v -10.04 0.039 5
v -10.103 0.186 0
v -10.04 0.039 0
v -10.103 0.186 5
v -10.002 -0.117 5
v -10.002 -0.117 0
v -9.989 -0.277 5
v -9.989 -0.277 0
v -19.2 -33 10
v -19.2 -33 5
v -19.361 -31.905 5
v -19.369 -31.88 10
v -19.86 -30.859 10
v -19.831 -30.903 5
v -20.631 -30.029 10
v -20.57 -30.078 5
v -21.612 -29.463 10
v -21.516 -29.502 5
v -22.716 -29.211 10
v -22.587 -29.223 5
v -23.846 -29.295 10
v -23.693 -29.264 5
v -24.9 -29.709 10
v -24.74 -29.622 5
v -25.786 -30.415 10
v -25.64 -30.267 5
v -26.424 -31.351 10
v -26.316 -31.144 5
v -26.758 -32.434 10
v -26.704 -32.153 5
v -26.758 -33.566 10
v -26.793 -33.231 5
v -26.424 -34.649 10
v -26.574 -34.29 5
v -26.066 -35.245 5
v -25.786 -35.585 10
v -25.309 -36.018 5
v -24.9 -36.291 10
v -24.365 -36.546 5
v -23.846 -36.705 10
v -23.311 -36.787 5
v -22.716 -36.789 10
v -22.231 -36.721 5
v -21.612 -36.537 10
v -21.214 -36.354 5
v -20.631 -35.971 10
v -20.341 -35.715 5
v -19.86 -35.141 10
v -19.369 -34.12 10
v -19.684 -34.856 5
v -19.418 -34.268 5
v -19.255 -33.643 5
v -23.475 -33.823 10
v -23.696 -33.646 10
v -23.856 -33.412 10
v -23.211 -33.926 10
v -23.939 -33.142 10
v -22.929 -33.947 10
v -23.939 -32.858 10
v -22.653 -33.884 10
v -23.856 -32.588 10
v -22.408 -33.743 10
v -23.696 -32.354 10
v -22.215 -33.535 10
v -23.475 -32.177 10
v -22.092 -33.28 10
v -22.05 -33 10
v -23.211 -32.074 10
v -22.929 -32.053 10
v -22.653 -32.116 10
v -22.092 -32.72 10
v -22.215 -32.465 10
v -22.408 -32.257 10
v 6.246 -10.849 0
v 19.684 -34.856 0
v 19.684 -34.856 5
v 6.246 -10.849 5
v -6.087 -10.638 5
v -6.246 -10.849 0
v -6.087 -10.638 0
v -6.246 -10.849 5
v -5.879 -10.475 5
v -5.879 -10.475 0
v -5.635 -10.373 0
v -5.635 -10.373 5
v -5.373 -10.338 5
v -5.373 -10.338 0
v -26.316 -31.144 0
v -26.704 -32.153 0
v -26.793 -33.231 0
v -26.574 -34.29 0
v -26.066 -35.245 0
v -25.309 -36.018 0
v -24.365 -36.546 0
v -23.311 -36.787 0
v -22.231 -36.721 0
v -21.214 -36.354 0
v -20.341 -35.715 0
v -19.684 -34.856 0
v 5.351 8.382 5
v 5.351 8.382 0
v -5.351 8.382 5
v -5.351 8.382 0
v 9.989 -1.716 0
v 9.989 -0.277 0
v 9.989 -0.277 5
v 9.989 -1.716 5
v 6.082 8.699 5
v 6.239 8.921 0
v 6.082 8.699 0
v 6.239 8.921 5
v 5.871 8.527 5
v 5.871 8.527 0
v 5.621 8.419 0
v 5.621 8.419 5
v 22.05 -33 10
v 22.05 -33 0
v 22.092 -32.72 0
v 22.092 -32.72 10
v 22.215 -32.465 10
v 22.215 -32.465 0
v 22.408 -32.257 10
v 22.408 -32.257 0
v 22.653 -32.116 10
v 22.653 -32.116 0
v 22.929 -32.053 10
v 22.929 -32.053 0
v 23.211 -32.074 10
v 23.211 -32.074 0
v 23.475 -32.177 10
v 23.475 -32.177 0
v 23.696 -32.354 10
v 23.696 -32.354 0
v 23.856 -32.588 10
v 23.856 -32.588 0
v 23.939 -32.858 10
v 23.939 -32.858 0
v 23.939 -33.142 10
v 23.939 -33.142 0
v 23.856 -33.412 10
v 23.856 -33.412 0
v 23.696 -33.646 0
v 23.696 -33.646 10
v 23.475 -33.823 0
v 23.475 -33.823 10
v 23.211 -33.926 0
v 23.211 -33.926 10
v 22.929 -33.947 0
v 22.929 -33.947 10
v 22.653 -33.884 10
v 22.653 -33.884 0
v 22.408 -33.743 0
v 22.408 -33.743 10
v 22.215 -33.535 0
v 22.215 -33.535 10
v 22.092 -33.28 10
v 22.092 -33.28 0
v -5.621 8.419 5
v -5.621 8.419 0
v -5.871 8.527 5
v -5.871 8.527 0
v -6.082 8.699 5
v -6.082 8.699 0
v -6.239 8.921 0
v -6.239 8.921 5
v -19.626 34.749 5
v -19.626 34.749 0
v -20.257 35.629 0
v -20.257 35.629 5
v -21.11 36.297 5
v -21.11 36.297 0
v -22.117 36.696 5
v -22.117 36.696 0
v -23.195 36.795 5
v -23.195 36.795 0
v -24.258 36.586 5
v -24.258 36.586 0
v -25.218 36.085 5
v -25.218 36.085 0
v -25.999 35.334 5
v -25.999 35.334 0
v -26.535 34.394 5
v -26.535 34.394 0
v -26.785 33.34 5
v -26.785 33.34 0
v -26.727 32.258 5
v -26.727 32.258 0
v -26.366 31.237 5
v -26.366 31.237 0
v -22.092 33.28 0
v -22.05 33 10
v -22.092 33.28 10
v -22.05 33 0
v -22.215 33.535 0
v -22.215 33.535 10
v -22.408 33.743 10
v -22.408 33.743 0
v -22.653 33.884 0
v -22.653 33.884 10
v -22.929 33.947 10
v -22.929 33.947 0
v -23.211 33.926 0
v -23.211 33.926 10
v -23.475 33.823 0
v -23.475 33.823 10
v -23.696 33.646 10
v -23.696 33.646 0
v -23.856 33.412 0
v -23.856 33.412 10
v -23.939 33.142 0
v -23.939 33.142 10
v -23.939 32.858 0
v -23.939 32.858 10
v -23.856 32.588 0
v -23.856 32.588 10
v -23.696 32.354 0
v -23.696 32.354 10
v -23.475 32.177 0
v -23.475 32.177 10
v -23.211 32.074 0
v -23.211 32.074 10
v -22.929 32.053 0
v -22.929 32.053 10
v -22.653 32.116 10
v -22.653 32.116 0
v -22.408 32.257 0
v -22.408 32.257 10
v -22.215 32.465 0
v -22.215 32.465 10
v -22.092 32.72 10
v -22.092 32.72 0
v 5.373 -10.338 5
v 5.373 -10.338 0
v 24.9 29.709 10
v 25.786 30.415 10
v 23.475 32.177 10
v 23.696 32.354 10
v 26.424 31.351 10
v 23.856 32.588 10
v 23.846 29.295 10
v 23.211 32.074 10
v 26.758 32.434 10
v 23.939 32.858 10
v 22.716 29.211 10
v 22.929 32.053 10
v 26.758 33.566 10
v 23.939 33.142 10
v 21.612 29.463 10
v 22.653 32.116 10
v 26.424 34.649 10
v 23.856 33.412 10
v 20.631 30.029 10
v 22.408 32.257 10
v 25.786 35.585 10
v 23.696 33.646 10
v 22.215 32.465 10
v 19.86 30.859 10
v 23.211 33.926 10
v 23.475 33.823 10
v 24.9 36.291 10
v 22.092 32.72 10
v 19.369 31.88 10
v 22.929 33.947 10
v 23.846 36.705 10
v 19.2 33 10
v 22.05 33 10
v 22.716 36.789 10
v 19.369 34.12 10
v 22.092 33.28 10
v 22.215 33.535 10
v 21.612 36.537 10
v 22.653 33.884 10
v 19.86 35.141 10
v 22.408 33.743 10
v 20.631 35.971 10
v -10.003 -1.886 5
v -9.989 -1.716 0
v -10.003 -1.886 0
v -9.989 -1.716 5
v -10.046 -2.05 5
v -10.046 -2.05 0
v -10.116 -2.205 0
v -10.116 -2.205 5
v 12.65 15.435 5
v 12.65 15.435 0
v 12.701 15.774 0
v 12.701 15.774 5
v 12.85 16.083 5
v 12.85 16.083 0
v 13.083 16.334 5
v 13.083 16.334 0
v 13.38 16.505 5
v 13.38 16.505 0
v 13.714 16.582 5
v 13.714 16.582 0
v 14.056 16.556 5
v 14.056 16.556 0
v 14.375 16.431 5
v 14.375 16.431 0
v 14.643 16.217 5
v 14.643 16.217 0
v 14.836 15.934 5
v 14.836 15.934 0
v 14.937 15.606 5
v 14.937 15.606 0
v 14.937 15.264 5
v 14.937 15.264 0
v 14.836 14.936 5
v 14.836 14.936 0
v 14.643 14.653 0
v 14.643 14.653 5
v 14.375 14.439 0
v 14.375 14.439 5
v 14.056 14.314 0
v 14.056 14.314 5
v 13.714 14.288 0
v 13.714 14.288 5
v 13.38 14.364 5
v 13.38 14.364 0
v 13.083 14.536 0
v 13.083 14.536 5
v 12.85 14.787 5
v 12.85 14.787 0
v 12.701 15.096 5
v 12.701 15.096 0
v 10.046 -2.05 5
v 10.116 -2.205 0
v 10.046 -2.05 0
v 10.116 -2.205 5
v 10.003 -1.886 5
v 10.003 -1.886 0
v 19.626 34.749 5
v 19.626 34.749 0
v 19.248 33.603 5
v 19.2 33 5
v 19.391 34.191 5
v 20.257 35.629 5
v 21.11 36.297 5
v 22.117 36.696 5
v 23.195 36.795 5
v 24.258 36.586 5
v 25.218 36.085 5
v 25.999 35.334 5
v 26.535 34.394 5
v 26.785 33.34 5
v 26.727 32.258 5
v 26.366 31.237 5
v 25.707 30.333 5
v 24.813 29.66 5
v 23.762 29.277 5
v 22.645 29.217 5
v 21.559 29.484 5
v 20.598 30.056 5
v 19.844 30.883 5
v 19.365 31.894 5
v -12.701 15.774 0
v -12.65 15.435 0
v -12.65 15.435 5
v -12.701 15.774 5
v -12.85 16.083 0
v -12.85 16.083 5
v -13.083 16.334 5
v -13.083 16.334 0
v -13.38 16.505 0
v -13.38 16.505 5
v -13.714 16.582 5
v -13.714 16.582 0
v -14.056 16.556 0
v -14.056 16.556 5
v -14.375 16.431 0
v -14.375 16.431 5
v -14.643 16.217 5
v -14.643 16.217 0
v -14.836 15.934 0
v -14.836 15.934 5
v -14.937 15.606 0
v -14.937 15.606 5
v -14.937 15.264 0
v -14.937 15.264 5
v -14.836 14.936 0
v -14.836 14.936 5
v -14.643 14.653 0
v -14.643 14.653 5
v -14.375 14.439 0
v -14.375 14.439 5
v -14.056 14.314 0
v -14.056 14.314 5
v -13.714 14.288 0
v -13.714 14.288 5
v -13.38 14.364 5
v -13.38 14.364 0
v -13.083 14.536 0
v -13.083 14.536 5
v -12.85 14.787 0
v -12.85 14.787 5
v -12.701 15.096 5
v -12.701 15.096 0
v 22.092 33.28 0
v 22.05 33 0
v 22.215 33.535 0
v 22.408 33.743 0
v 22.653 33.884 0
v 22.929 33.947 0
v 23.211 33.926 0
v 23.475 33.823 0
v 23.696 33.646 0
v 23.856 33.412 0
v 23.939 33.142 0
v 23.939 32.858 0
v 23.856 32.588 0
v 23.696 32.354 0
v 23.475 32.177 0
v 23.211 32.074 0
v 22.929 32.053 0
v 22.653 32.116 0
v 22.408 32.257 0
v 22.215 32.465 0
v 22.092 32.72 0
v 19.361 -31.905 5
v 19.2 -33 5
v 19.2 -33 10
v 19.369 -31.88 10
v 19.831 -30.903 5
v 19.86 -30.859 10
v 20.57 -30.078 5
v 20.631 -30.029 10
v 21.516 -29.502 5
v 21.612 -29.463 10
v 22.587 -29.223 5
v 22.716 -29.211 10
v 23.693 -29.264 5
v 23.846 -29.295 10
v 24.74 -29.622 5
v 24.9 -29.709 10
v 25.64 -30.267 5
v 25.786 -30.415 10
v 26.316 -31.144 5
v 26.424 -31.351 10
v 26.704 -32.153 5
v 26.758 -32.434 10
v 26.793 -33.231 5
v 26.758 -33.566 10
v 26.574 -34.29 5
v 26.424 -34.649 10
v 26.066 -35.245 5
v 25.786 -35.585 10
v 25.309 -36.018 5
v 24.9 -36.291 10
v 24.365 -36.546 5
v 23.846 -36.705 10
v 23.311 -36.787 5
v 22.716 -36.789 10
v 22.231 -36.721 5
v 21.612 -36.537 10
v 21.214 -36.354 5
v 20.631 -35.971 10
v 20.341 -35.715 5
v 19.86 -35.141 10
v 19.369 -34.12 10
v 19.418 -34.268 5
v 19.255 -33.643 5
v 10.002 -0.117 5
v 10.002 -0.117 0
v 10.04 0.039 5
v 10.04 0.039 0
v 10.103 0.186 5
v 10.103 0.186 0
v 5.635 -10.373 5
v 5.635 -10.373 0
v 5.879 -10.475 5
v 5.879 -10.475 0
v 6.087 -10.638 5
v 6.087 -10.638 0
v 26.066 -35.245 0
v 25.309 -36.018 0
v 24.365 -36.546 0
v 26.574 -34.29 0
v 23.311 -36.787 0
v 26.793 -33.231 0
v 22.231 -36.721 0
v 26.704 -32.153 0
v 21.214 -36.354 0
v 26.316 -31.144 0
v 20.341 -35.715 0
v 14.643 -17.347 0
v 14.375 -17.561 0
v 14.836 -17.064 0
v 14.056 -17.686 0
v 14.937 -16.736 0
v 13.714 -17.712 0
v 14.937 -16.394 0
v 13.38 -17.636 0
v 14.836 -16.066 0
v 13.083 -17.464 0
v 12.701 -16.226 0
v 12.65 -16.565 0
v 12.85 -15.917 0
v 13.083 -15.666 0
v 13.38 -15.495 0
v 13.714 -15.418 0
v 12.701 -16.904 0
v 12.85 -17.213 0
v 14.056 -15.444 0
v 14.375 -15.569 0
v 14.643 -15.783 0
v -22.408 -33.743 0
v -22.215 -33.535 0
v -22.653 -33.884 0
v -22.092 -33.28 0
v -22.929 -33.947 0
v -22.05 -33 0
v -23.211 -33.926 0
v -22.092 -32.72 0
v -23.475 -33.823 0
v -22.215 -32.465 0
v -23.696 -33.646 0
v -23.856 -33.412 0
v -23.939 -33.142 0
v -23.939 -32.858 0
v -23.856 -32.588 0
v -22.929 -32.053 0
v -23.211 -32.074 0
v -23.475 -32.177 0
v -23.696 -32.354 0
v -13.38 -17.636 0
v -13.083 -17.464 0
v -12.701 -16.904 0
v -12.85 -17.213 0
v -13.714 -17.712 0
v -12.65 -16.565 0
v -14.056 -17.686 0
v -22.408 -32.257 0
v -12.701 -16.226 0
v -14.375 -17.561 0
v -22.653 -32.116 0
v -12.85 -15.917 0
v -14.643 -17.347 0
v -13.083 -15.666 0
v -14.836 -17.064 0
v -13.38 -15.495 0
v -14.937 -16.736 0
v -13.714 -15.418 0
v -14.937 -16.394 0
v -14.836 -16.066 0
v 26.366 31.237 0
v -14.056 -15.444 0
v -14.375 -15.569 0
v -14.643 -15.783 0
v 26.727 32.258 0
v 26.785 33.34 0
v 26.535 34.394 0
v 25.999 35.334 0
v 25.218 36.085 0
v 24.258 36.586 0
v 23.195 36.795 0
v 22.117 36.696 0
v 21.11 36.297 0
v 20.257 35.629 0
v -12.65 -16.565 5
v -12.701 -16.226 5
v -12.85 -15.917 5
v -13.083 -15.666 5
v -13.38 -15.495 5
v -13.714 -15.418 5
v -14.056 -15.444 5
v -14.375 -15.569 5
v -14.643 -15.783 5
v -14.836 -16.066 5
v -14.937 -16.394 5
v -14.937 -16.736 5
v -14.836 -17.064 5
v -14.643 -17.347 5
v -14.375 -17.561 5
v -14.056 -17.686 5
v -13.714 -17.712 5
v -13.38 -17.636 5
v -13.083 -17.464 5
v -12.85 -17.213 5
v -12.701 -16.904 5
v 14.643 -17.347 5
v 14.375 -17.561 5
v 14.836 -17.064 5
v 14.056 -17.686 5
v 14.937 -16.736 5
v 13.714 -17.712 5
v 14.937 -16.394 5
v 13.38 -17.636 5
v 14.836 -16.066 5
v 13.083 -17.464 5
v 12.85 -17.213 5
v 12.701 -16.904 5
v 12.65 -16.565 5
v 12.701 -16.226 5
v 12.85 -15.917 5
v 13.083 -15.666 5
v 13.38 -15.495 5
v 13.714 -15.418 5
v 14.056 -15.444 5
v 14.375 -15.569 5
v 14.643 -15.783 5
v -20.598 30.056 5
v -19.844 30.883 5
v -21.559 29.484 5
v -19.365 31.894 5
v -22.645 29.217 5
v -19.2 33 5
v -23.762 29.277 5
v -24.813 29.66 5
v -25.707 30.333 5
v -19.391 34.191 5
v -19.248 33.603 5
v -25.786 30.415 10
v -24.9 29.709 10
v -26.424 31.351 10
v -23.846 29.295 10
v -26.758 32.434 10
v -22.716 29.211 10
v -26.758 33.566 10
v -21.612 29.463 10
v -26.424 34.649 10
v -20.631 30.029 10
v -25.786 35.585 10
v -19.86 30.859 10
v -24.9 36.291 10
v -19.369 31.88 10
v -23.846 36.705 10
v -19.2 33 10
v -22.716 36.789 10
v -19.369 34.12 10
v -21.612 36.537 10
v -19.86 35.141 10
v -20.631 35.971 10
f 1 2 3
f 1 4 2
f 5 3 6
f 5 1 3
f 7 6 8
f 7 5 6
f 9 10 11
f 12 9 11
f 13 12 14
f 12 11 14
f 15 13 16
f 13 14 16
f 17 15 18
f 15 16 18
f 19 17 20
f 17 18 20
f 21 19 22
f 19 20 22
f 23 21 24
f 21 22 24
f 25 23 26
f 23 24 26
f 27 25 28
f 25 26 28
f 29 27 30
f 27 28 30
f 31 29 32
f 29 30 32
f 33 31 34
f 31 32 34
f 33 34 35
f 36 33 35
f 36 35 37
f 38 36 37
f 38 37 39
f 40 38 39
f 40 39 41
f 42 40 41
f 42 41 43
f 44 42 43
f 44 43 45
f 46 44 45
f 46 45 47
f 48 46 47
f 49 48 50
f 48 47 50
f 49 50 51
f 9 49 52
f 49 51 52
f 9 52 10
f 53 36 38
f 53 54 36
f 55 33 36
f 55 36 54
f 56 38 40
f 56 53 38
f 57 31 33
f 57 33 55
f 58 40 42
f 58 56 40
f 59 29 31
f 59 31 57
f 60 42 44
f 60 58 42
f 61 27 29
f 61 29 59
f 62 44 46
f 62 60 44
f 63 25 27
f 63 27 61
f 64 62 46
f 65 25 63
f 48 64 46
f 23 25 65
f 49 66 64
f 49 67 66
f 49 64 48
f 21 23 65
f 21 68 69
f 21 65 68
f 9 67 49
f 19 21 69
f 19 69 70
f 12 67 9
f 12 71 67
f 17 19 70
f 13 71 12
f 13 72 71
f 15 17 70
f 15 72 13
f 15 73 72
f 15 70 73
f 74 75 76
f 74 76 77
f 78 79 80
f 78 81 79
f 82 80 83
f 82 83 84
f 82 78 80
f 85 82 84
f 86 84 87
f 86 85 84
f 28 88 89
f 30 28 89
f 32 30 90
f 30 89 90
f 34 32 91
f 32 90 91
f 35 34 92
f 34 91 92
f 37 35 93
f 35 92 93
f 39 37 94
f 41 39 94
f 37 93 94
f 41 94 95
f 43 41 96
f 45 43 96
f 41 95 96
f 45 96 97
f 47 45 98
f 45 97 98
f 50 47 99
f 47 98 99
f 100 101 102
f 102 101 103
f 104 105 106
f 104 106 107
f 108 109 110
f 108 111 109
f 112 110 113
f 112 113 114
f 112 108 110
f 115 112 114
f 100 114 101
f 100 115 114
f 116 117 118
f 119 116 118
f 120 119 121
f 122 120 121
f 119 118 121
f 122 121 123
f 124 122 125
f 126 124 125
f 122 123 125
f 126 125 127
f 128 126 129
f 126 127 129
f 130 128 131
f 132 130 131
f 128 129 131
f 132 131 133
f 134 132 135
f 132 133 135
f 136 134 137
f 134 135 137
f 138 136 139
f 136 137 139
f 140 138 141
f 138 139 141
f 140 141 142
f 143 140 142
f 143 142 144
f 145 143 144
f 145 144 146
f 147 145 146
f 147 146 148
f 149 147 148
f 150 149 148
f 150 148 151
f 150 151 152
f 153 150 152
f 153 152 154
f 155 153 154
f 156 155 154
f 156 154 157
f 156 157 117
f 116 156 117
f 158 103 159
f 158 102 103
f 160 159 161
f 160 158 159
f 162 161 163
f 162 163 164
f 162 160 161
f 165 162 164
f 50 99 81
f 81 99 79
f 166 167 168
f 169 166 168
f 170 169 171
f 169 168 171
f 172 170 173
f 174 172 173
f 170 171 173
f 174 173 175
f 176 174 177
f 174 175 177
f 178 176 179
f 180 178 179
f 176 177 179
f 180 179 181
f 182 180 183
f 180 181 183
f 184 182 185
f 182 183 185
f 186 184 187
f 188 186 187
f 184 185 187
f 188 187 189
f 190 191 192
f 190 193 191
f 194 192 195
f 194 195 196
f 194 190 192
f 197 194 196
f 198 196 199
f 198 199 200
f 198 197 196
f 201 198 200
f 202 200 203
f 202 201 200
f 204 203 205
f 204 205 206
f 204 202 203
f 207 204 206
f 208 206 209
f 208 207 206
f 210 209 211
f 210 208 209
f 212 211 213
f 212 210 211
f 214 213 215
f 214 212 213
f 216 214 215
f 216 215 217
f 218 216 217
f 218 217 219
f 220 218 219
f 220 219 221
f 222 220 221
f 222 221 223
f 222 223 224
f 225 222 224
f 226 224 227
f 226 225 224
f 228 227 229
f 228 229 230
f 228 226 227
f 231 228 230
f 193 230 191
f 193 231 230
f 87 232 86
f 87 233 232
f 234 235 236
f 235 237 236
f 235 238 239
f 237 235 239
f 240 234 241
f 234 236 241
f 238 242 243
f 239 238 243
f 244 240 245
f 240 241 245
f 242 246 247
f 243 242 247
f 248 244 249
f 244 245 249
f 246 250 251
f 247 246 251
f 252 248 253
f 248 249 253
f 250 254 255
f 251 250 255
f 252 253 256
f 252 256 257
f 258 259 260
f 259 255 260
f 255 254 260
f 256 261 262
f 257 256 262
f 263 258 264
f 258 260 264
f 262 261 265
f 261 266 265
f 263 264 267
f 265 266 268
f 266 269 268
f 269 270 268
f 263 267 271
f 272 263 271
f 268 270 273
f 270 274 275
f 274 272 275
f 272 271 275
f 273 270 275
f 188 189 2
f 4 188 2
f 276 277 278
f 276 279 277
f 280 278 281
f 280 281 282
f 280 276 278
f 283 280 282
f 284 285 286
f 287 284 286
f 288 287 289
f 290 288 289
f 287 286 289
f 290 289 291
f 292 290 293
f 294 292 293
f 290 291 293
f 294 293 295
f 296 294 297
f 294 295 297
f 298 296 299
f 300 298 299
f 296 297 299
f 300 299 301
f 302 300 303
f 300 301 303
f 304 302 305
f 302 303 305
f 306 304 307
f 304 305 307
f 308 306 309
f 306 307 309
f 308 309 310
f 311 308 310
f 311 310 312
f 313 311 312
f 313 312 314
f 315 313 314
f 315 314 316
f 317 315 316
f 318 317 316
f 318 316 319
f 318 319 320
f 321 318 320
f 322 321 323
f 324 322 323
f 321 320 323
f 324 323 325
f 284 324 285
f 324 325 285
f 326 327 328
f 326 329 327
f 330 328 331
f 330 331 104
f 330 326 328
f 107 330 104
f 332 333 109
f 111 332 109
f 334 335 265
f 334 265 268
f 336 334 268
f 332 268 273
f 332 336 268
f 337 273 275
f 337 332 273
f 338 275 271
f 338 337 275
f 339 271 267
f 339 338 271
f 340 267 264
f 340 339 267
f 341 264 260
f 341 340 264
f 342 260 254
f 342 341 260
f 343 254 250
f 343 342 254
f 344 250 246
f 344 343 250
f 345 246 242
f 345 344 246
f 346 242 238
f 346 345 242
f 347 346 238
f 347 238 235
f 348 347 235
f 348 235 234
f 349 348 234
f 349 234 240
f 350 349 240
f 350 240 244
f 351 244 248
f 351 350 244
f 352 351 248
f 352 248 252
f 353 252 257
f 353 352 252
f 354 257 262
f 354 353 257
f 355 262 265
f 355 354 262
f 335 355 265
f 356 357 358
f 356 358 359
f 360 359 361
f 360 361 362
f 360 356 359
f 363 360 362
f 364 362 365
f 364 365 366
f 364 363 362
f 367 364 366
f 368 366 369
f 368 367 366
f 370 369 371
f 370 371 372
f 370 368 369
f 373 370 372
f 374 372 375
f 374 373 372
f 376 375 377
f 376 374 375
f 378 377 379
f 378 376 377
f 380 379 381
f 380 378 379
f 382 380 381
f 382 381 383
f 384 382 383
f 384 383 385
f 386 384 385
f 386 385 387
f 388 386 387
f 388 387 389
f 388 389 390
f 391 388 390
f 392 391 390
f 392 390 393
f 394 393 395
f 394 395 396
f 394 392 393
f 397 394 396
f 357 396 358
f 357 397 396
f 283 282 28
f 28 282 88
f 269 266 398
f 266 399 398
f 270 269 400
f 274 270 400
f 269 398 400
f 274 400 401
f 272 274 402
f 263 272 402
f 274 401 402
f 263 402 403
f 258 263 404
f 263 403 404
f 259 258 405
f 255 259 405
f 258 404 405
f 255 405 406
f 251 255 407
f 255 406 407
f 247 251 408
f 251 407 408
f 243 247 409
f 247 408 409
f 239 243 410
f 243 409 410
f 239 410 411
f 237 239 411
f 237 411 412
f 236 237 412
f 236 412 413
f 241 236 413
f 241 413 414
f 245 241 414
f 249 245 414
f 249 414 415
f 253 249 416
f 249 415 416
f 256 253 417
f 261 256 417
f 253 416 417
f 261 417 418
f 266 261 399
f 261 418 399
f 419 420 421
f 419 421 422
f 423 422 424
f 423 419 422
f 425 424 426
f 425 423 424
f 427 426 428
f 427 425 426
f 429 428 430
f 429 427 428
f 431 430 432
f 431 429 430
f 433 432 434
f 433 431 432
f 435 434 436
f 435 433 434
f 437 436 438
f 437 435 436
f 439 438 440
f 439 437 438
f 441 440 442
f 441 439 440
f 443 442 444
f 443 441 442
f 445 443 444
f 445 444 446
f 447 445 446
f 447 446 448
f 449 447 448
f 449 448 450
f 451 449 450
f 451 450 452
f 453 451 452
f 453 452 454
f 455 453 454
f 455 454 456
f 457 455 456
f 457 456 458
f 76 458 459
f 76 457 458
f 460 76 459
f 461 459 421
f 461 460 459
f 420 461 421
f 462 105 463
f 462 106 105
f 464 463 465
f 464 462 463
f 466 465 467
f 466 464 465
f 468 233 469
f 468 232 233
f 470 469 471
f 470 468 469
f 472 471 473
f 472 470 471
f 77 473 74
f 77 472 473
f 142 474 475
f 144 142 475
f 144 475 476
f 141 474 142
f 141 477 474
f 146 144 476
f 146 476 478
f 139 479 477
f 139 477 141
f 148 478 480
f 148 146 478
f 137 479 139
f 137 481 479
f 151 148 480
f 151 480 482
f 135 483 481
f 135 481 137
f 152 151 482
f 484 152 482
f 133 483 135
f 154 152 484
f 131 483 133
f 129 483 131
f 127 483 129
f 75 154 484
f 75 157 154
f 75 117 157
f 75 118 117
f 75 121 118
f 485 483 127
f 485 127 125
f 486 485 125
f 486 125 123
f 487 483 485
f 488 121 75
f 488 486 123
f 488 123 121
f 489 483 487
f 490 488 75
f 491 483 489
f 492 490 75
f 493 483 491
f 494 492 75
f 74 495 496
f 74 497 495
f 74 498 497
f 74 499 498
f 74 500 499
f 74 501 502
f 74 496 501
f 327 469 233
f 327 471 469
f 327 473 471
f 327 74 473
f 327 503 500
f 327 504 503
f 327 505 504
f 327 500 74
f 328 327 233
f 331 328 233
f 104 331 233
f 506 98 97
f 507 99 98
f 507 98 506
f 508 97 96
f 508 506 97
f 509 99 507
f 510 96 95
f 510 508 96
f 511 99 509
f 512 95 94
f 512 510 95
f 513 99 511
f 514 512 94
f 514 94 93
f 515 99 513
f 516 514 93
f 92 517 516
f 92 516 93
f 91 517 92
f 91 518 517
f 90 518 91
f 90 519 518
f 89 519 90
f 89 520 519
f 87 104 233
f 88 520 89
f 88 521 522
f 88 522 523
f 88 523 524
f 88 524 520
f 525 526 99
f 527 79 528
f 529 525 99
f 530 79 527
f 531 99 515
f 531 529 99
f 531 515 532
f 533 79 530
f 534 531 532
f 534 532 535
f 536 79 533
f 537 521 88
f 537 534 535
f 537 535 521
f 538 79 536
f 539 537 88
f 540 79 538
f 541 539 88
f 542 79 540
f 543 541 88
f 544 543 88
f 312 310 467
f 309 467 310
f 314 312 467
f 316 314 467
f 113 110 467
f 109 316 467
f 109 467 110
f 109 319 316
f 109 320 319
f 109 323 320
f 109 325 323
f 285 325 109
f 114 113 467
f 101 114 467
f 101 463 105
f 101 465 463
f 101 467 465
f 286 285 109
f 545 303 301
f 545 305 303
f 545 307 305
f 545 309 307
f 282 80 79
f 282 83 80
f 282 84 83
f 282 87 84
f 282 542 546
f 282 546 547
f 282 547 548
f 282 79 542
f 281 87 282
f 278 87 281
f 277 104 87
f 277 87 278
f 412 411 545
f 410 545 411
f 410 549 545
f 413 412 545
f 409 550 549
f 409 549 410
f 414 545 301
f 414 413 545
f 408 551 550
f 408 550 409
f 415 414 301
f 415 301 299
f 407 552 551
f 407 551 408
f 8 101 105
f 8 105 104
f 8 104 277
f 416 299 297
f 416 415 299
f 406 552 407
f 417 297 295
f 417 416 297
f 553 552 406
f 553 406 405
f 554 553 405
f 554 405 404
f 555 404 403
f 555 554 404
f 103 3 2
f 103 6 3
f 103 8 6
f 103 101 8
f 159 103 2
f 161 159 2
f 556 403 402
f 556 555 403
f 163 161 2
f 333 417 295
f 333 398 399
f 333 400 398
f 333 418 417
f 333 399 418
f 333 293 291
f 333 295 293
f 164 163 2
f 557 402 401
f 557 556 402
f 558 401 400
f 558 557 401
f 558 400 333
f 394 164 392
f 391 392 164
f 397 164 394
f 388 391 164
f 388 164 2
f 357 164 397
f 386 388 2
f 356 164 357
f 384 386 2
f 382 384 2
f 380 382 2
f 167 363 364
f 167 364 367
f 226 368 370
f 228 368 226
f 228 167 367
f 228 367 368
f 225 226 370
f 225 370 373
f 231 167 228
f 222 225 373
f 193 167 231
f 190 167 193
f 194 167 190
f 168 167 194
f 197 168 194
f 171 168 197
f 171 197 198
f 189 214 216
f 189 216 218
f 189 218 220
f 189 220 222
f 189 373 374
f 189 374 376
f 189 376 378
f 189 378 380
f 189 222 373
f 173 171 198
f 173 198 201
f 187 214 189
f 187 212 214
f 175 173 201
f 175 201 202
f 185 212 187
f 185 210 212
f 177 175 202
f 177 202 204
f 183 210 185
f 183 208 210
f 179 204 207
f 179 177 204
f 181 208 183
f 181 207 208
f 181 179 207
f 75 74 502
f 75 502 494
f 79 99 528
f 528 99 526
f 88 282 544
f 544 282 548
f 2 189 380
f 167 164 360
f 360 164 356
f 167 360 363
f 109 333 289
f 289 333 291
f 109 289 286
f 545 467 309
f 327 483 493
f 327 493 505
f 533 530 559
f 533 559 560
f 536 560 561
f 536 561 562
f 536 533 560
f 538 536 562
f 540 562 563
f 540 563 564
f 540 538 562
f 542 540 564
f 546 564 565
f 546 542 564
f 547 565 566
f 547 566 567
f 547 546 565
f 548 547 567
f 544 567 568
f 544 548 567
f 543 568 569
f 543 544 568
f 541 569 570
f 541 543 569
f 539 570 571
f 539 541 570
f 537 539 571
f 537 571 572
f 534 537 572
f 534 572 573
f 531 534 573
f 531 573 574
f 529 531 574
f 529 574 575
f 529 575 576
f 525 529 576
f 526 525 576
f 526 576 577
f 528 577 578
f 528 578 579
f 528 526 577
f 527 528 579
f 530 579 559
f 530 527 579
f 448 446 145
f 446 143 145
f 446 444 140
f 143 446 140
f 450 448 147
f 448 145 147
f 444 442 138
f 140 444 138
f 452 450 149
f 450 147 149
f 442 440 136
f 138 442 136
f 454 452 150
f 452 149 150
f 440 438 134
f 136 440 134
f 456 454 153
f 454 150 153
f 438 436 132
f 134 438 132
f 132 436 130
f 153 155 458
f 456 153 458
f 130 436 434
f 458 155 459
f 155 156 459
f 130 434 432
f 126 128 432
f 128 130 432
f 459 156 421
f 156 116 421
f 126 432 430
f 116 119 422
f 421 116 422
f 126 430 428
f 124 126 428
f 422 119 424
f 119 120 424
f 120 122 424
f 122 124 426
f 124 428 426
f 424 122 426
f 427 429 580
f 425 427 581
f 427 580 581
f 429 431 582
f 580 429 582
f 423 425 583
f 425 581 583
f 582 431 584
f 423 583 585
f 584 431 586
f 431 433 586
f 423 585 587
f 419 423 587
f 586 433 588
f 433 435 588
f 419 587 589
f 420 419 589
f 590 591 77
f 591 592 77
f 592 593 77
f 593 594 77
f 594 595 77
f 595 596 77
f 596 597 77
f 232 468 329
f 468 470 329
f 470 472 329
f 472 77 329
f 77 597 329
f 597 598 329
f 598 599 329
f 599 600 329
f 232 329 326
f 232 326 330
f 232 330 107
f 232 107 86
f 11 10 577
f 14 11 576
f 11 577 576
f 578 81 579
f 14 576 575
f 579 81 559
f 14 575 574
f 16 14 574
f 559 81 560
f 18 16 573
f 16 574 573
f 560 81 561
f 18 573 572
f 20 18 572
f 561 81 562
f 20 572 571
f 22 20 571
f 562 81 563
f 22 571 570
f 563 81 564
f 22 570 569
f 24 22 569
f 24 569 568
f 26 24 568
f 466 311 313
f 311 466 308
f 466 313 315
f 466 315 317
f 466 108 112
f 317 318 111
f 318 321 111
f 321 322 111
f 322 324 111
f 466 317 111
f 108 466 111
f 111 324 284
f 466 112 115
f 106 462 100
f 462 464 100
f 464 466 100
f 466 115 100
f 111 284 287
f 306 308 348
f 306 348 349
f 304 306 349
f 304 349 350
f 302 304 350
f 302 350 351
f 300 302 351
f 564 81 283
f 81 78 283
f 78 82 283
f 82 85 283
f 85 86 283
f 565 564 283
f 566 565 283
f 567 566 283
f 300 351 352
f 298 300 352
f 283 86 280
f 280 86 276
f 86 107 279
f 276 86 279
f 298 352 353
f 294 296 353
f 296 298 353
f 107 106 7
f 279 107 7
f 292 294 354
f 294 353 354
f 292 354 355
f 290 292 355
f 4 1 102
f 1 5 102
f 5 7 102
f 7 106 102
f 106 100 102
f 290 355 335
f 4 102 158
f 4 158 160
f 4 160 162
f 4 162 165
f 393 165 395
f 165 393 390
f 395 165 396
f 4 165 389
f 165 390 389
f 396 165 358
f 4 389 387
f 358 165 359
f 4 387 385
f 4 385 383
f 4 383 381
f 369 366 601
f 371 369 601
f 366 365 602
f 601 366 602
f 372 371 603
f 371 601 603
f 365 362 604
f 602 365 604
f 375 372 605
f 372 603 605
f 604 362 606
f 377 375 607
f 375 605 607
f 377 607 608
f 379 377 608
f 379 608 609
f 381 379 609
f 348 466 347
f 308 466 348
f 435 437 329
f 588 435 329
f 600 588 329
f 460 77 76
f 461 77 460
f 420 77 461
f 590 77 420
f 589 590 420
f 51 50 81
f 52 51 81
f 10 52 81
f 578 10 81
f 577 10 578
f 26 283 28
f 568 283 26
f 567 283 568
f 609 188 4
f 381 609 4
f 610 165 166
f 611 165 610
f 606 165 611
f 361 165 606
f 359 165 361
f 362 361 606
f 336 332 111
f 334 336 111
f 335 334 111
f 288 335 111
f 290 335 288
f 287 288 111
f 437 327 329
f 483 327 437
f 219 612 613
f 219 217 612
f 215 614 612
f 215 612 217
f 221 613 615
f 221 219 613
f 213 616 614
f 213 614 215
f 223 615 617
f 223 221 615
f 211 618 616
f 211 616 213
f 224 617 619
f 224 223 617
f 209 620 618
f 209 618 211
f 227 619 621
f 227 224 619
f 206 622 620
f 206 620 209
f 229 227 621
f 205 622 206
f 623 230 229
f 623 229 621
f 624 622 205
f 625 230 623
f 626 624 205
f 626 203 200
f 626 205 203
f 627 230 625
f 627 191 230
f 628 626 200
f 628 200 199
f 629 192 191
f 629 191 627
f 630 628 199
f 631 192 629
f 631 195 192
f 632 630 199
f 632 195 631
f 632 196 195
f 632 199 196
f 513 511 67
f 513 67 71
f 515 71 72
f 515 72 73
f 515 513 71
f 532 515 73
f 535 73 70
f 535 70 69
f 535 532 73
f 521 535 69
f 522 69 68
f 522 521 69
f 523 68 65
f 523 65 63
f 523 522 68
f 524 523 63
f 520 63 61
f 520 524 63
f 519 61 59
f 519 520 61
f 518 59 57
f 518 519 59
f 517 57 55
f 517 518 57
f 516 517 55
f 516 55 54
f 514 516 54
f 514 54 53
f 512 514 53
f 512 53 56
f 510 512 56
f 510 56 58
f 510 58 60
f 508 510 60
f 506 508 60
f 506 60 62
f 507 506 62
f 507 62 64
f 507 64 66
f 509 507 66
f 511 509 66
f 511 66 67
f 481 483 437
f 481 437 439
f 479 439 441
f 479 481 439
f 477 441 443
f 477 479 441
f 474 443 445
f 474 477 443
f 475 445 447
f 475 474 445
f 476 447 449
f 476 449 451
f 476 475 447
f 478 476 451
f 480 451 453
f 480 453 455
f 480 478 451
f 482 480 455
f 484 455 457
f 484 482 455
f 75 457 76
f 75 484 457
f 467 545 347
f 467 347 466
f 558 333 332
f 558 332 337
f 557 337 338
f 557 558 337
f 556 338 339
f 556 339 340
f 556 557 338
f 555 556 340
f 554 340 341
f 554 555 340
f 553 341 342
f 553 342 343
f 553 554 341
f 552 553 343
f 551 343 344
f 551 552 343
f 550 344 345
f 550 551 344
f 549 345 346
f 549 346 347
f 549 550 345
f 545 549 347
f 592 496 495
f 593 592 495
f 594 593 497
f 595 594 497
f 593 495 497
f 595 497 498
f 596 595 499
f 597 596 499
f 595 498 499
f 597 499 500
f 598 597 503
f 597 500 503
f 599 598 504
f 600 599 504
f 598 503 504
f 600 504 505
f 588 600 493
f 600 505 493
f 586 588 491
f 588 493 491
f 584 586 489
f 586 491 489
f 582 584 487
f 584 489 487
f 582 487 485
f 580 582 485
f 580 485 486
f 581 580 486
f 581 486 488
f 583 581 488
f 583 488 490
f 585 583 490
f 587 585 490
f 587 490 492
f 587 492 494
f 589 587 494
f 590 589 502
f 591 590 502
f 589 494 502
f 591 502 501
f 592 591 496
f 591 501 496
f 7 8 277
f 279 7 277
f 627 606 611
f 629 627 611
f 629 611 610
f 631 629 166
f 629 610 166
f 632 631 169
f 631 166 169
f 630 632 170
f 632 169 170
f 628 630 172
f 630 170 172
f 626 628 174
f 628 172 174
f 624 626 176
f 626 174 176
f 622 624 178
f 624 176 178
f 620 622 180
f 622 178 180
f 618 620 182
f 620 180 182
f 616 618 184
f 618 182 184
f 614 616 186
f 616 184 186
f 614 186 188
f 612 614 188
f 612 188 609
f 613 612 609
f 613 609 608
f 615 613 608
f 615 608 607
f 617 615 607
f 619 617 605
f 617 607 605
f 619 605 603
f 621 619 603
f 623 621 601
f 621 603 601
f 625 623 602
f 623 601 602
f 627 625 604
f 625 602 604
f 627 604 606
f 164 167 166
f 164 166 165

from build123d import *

# Parameters (mm, degrees)
SKETCH_R      = 0.95
SKETCH_R_2    = 1.15
PAD_DEPTH     = 5
SKETCH001_R   = 3.8
SKETCH001_R_2 = 0.95
PAD001_DEPTH  = 5
FILLET_R      = 1


with BuildPart() as part:
    # Sketch → Pad (new body)
    with BuildSketch(Plane.XY):
        with BuildLine():
            ThreePointArc((-26.31583, -31.143856), (-24.856144, -36.31583), (-19.68417, -34.856144))
            Line((-19.68417, -34.856144), (-5.959198, -10.337748))
            Line((-5.959198, -10.337748), (0, -10.337748))
            Line((0, -10.337748), (0, 8.381557))
            Line((-5.959198, 8.381557), (0, 8.381557))
            Line((-19.626283, 34.748723), (-5.959198, 8.381557))
            ThreePointArc((-19.626283, 34.748723), (-24.755923, 36.369975), (-26.366218, 31.236885))
            Line((-26.366218, 31.236885), (-9.988881, -0.031456))
            Line((-9.988881, -0.031456), (-9.988881, -1.977268))
            Line((-9.988881, -1.977268), (-26.31583, -31.143856))
        make_face()
        with Locations((-23, 33)):
            Circle(SKETCH_R, mode=Mode.SUBTRACT)
        with Locations((-23, -33)):
            Circle(SKETCH_R, mode=Mode.SUBTRACT)
        with Locations((-13.8, 15.434951)):
            Circle(SKETCH_R_2, mode=Mode.SUBTRACT)
        with Locations((-13.8, -16.565049)):
            Circle(SKETCH_R_2, mode=Mode.SUBTRACT)
    extrude(amount=PAD_DEPTH)

    # Sketch001 (on Face16 of Pad) → Pad001 (join)
    with BuildSketch(Plane.XY.offset(5)):
        with Locations((-23, 33)):
            Circle(SKETCH001_R)
        with Locations((-23, 33)):
            Circle(SKETCH001_R_2, mode=Mode.SUBTRACT)
        with Locations((-23, -33)):
            Circle(SKETCH001_R)
        with Locations((-23, -33)):
            Circle(SKETCH001_R_2, mode=Mode.SUBTRACT)
    extrude(amount=PAD001_DEPTH)

    # Mirrored: part across Sketch001 V_Axis


with BuildPart() as part_1:
    add(part.part)
    add(part.part.mirror(Plane(origin=(0, 0, 5), x_dir=(0, 0, 1), z_dir=(1, 0, 0))))

    # Fillet
    fillet_edges = [part_1.edges().sort_by_distance(p)[0] for p in [
        (-5.959198, -10.337748, 2.5),
        (5.959198, -10.337748, 2.5),
        (-9.988881, -0.031456, 2.5),
        (-9.988881, -1.977268, 2.5),
        (-5.959198, 8.381557, 2.5),
        (5.959198, 8.381557, 2.5),
        (9.988881, -1.977268, 2.5),
        (9.988881, -0.031456, 2.5),
    ]]
    fillet(fillet_edges, radius=FILLET_R)


solid = part_1.part
